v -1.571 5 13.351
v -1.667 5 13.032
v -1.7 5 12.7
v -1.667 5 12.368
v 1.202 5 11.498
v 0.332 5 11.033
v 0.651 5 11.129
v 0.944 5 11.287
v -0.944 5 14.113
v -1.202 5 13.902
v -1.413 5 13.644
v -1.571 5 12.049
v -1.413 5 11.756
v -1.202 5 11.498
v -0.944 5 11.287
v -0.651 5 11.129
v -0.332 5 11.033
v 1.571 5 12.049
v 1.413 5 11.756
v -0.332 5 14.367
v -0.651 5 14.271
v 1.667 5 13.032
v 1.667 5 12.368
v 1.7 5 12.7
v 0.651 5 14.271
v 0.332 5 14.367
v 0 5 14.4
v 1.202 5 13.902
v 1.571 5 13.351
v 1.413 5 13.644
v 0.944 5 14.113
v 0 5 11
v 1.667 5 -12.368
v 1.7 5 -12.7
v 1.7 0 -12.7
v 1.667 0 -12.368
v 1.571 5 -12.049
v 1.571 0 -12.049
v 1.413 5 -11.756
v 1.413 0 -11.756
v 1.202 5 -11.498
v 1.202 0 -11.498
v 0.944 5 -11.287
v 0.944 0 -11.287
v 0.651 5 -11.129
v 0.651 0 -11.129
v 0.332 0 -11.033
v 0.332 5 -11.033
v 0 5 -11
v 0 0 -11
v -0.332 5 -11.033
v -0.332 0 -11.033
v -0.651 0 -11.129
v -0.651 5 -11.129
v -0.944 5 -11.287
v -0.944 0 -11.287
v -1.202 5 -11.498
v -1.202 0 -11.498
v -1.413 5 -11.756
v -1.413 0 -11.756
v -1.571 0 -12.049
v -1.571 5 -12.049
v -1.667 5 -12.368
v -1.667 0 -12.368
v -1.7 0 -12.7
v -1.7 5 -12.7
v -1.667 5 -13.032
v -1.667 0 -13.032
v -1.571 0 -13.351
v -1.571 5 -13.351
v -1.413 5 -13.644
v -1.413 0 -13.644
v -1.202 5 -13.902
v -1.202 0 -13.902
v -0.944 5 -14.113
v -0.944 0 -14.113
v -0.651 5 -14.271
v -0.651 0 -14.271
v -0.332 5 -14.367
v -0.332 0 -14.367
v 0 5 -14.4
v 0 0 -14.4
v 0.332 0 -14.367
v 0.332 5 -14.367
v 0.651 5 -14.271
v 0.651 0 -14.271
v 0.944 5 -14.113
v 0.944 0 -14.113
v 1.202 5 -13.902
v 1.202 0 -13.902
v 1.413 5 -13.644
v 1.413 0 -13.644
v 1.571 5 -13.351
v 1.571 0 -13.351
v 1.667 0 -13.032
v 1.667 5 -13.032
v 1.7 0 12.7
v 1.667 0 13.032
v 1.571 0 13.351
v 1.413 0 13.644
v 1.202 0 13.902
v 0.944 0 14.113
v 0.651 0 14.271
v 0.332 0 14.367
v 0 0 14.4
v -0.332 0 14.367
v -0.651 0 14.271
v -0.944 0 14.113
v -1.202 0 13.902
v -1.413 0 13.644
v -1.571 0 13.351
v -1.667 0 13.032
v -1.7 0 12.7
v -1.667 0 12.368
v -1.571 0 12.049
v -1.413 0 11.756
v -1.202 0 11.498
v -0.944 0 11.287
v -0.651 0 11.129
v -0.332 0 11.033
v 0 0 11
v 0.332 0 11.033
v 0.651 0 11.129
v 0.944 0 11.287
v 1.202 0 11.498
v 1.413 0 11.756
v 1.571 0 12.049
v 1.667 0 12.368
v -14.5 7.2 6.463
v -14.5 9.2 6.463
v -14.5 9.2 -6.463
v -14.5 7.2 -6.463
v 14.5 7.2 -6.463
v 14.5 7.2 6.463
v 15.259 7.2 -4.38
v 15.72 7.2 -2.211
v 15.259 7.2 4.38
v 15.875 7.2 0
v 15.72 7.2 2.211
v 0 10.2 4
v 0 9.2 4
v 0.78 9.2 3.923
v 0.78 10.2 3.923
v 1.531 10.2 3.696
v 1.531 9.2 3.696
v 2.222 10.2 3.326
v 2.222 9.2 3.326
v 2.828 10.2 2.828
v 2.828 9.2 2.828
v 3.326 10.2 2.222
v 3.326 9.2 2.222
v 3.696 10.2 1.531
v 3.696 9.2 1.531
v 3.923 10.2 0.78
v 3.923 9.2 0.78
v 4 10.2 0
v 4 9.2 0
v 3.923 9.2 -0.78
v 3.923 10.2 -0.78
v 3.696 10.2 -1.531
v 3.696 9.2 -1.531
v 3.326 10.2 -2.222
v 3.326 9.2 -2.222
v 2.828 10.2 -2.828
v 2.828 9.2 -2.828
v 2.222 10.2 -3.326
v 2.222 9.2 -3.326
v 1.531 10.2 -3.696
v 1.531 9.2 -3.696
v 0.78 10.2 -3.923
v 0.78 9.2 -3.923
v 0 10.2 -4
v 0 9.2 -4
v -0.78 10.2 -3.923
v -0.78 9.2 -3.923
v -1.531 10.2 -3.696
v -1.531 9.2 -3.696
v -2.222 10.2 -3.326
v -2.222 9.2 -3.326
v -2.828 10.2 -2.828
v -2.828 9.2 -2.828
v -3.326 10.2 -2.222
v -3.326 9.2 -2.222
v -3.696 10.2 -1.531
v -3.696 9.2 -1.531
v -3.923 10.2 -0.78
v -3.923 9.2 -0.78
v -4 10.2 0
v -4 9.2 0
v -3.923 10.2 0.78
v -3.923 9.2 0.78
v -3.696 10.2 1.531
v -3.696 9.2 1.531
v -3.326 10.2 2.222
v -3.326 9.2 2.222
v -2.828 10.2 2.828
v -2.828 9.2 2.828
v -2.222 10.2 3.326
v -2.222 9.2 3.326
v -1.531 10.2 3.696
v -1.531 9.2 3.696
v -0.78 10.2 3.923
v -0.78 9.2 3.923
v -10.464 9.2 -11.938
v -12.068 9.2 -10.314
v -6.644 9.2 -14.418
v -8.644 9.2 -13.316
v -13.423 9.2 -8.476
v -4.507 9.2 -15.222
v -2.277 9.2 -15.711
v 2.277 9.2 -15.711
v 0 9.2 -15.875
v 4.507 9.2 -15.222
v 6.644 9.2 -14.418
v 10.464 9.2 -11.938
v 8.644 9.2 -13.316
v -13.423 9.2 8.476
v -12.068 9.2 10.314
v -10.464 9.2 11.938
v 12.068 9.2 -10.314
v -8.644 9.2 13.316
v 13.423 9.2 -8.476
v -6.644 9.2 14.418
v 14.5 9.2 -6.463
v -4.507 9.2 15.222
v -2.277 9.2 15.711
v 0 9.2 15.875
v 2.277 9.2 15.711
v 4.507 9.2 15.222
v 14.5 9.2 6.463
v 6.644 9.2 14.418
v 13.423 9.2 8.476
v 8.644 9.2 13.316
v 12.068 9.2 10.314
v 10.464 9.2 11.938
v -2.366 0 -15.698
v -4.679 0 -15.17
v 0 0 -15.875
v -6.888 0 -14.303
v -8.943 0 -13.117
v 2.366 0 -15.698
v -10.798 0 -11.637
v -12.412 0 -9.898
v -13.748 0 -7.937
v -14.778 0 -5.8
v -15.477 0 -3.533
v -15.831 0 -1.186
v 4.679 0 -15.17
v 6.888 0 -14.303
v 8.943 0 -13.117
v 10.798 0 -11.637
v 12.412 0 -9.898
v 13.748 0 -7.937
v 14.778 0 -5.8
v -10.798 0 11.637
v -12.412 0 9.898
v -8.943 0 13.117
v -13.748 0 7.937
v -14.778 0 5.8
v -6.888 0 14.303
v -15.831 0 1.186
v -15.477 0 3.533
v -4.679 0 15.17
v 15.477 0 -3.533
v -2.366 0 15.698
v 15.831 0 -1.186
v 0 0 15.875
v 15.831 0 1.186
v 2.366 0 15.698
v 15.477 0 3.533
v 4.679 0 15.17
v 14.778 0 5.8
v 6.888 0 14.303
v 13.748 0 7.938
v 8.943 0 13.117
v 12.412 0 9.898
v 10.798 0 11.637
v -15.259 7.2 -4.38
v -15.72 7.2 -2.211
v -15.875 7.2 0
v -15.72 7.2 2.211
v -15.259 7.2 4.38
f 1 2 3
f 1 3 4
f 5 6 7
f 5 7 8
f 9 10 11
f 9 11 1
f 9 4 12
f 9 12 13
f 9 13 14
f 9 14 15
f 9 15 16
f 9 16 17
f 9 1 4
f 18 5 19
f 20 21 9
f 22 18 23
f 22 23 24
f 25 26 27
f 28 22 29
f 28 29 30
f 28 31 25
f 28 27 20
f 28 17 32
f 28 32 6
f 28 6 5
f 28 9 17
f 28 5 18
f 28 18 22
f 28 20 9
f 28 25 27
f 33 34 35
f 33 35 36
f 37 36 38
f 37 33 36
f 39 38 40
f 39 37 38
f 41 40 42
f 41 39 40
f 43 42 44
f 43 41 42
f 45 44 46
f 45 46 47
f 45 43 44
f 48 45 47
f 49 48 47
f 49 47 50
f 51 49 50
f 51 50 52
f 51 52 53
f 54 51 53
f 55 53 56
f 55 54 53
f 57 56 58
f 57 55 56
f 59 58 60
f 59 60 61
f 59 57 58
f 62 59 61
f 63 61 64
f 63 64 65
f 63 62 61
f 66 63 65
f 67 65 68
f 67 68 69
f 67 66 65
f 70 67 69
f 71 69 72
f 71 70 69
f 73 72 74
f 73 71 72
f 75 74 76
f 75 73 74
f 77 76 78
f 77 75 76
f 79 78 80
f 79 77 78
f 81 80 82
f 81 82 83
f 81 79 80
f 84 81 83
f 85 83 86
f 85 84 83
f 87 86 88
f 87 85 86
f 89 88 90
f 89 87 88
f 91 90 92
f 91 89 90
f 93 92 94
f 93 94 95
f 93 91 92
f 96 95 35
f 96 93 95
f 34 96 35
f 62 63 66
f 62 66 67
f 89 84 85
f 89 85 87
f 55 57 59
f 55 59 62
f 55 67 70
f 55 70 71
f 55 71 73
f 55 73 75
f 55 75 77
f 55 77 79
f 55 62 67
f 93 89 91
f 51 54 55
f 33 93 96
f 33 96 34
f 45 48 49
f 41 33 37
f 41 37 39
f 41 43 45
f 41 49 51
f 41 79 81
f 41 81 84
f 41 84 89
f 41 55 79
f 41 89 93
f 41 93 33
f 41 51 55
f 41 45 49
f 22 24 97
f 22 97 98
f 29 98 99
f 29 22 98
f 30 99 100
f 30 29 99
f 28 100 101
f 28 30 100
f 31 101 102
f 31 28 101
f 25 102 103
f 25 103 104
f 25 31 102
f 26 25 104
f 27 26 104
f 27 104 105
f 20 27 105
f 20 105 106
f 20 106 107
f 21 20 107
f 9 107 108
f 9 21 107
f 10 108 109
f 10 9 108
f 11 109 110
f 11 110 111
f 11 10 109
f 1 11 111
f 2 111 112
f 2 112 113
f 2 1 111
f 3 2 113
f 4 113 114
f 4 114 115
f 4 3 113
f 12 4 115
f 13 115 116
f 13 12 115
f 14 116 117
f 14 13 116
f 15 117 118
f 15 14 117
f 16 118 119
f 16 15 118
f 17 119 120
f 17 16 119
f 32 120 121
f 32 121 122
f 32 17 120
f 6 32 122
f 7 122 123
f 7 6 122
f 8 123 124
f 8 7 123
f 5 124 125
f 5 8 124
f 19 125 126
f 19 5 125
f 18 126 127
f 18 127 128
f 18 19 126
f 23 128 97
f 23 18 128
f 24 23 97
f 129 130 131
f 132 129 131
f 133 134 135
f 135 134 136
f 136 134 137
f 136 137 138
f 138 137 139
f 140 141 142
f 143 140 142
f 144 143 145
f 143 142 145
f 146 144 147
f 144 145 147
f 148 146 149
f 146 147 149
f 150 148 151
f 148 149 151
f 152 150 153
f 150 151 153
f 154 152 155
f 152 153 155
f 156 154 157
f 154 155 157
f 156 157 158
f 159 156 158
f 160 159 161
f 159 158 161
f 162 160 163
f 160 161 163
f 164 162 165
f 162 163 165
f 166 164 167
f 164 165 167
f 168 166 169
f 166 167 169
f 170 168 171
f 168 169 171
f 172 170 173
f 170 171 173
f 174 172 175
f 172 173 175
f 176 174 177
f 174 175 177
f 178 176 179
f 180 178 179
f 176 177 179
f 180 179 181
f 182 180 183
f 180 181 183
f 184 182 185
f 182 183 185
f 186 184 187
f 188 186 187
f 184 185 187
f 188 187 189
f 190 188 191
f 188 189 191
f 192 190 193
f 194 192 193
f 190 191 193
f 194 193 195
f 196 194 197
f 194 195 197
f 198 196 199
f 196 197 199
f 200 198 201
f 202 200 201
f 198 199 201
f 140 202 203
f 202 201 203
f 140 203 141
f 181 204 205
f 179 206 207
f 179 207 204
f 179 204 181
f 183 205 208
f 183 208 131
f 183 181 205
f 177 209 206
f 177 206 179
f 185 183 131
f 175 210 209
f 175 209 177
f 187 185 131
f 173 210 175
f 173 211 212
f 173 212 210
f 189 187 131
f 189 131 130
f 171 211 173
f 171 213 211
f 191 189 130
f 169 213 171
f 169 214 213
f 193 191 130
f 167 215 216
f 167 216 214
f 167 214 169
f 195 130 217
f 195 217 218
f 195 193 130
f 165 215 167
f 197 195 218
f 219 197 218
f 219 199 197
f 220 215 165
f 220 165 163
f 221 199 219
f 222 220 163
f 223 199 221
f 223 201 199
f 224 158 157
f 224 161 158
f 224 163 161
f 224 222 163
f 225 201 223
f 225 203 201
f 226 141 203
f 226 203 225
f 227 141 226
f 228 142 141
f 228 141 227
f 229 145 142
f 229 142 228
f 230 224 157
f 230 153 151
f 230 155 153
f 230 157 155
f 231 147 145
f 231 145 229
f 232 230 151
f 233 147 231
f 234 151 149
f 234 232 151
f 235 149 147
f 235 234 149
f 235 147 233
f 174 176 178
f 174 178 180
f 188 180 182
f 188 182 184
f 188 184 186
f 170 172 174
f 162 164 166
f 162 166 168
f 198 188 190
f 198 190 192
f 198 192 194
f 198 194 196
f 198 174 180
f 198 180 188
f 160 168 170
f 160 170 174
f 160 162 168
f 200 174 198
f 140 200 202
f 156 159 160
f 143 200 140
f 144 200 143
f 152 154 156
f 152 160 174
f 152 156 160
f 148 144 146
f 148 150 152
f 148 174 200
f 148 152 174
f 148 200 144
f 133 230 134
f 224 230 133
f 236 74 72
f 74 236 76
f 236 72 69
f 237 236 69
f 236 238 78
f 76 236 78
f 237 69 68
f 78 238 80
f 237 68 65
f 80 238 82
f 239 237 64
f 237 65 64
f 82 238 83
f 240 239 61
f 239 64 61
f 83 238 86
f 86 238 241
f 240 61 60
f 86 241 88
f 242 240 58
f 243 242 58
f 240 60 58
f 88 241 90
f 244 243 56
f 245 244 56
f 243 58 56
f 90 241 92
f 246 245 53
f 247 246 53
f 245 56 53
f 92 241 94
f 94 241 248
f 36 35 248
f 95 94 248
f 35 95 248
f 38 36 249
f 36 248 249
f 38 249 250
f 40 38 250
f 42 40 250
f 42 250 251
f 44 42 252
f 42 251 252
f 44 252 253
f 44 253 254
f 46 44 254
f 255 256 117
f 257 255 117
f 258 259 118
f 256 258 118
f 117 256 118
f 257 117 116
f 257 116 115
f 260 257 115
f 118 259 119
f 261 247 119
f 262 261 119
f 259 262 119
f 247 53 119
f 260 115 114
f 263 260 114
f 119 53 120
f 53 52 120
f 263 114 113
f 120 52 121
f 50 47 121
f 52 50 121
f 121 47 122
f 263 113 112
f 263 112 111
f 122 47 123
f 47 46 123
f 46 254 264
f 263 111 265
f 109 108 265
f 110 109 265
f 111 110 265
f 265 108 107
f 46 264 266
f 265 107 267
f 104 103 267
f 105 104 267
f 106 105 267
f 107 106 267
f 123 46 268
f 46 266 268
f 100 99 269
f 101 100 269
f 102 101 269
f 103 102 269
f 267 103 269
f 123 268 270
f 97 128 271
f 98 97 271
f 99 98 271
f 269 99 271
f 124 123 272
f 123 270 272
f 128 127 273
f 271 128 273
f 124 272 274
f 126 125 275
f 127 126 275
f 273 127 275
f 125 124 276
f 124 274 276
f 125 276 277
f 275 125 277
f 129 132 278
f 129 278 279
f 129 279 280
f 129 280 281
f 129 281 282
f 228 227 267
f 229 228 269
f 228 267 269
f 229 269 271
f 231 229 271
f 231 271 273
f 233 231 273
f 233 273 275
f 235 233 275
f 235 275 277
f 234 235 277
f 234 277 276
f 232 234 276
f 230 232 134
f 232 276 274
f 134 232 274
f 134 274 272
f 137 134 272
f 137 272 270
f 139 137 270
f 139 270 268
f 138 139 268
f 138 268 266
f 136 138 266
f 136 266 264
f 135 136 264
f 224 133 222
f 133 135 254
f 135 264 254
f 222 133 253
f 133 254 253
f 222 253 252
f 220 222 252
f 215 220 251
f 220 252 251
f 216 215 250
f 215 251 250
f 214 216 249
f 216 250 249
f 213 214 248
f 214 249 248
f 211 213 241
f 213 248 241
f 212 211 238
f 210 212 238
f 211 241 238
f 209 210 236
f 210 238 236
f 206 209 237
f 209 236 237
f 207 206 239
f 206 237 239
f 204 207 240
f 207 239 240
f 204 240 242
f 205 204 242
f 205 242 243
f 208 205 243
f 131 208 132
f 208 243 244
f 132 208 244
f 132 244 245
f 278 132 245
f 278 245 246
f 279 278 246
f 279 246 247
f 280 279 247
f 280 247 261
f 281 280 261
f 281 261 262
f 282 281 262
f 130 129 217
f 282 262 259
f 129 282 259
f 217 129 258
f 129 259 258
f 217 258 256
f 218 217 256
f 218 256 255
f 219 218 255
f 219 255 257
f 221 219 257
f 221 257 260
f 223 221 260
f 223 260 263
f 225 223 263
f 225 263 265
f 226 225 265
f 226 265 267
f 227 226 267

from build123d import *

# Parameters (mm, degrees)
SKETCH1_R               = 15.875
BOSS_EXTRUDE1_DEPTH     = 9.2
SKETCH2_W               = 2.259426776
SKETCH2_H               = 16.292984729
SKETCH2_W_2             = 2.453909841
SKETCH2_H_2             = 18.61191006
CUT_EXTRUDE2_DEPTH      = 2
SKETCH3_R               = 4
BOSS_EXTRUDE3_DEPTH     = 1
BOSS_EXTRUDE4_START     = -5
BOSS_EXTRUDE4_OUTLINE_R = 1.7
BOSS_EXTRUDE4_DEPTH     = 5


# Read off the part's stored shape, not the designer's step: Boss-Extrude4
with BuildPart() as part:
    # Sketch1 → Boss-Extrude1 (new body)
    with BuildSketch(Plane(origin=(0, 0, 0), x_dir=(1, 0, 0), z_dir=(0, 1, 0))):
        with Locations(Location((0, 0, 0), (0, 0, 270))):
            Circle(SKETCH1_R)
    extrude(amount=BOSS_EXTRUDE1_DEPTH)

    # Sketch2 → Cut-Extrude2 (cut)
    with BuildSketch(Plane(origin=(0, 9.2, 0), x_dir=(1, 0, 0), z_dir=(0, 1, 0))):
        with Locations((-15.629713388, -0.847675915)):
            Rectangle(SKETCH2_W, SKETCH2_H)
        with Locations((15.726954921, -2.007138581)):
            Rectangle(SKETCH2_W_2, SKETCH2_H_2)
    extrude(amount=-CUT_EXTRUDE2_DEPTH, mode=Mode.SUBTRACT)

    # Sketch3 → Boss-Extrude3 (add)
    with BuildSketch(Plane(origin=(0, 9.2, 0), x_dir=(1, 0, 0), z_dir=(0, 1, 0))):
        with Locations(Location((0, 0, 0), (0, 0, 270))):
            Circle(SKETCH3_R)
    extrude(amount=BOSS_EXTRUDE3_DEPTH)

    # Boss-Extrude4 outline → Boss-Extrude4 (cut)
    with BuildSketch(Plane.XZ.offset(BOSS_EXTRUDE4_START)):
        with Locations((0, 12.7)):
            Circle(BOSS_EXTRUDE4_OUTLINE_R)
        with Locations((0, -12.7)):
            Circle(BOSS_EXTRUDE4_OUTLINE_R)
    extrude(amount=BOSS_EXTRUDE4_DEPTH, mode=Mode.SUBTRACT)


solid = part.part
